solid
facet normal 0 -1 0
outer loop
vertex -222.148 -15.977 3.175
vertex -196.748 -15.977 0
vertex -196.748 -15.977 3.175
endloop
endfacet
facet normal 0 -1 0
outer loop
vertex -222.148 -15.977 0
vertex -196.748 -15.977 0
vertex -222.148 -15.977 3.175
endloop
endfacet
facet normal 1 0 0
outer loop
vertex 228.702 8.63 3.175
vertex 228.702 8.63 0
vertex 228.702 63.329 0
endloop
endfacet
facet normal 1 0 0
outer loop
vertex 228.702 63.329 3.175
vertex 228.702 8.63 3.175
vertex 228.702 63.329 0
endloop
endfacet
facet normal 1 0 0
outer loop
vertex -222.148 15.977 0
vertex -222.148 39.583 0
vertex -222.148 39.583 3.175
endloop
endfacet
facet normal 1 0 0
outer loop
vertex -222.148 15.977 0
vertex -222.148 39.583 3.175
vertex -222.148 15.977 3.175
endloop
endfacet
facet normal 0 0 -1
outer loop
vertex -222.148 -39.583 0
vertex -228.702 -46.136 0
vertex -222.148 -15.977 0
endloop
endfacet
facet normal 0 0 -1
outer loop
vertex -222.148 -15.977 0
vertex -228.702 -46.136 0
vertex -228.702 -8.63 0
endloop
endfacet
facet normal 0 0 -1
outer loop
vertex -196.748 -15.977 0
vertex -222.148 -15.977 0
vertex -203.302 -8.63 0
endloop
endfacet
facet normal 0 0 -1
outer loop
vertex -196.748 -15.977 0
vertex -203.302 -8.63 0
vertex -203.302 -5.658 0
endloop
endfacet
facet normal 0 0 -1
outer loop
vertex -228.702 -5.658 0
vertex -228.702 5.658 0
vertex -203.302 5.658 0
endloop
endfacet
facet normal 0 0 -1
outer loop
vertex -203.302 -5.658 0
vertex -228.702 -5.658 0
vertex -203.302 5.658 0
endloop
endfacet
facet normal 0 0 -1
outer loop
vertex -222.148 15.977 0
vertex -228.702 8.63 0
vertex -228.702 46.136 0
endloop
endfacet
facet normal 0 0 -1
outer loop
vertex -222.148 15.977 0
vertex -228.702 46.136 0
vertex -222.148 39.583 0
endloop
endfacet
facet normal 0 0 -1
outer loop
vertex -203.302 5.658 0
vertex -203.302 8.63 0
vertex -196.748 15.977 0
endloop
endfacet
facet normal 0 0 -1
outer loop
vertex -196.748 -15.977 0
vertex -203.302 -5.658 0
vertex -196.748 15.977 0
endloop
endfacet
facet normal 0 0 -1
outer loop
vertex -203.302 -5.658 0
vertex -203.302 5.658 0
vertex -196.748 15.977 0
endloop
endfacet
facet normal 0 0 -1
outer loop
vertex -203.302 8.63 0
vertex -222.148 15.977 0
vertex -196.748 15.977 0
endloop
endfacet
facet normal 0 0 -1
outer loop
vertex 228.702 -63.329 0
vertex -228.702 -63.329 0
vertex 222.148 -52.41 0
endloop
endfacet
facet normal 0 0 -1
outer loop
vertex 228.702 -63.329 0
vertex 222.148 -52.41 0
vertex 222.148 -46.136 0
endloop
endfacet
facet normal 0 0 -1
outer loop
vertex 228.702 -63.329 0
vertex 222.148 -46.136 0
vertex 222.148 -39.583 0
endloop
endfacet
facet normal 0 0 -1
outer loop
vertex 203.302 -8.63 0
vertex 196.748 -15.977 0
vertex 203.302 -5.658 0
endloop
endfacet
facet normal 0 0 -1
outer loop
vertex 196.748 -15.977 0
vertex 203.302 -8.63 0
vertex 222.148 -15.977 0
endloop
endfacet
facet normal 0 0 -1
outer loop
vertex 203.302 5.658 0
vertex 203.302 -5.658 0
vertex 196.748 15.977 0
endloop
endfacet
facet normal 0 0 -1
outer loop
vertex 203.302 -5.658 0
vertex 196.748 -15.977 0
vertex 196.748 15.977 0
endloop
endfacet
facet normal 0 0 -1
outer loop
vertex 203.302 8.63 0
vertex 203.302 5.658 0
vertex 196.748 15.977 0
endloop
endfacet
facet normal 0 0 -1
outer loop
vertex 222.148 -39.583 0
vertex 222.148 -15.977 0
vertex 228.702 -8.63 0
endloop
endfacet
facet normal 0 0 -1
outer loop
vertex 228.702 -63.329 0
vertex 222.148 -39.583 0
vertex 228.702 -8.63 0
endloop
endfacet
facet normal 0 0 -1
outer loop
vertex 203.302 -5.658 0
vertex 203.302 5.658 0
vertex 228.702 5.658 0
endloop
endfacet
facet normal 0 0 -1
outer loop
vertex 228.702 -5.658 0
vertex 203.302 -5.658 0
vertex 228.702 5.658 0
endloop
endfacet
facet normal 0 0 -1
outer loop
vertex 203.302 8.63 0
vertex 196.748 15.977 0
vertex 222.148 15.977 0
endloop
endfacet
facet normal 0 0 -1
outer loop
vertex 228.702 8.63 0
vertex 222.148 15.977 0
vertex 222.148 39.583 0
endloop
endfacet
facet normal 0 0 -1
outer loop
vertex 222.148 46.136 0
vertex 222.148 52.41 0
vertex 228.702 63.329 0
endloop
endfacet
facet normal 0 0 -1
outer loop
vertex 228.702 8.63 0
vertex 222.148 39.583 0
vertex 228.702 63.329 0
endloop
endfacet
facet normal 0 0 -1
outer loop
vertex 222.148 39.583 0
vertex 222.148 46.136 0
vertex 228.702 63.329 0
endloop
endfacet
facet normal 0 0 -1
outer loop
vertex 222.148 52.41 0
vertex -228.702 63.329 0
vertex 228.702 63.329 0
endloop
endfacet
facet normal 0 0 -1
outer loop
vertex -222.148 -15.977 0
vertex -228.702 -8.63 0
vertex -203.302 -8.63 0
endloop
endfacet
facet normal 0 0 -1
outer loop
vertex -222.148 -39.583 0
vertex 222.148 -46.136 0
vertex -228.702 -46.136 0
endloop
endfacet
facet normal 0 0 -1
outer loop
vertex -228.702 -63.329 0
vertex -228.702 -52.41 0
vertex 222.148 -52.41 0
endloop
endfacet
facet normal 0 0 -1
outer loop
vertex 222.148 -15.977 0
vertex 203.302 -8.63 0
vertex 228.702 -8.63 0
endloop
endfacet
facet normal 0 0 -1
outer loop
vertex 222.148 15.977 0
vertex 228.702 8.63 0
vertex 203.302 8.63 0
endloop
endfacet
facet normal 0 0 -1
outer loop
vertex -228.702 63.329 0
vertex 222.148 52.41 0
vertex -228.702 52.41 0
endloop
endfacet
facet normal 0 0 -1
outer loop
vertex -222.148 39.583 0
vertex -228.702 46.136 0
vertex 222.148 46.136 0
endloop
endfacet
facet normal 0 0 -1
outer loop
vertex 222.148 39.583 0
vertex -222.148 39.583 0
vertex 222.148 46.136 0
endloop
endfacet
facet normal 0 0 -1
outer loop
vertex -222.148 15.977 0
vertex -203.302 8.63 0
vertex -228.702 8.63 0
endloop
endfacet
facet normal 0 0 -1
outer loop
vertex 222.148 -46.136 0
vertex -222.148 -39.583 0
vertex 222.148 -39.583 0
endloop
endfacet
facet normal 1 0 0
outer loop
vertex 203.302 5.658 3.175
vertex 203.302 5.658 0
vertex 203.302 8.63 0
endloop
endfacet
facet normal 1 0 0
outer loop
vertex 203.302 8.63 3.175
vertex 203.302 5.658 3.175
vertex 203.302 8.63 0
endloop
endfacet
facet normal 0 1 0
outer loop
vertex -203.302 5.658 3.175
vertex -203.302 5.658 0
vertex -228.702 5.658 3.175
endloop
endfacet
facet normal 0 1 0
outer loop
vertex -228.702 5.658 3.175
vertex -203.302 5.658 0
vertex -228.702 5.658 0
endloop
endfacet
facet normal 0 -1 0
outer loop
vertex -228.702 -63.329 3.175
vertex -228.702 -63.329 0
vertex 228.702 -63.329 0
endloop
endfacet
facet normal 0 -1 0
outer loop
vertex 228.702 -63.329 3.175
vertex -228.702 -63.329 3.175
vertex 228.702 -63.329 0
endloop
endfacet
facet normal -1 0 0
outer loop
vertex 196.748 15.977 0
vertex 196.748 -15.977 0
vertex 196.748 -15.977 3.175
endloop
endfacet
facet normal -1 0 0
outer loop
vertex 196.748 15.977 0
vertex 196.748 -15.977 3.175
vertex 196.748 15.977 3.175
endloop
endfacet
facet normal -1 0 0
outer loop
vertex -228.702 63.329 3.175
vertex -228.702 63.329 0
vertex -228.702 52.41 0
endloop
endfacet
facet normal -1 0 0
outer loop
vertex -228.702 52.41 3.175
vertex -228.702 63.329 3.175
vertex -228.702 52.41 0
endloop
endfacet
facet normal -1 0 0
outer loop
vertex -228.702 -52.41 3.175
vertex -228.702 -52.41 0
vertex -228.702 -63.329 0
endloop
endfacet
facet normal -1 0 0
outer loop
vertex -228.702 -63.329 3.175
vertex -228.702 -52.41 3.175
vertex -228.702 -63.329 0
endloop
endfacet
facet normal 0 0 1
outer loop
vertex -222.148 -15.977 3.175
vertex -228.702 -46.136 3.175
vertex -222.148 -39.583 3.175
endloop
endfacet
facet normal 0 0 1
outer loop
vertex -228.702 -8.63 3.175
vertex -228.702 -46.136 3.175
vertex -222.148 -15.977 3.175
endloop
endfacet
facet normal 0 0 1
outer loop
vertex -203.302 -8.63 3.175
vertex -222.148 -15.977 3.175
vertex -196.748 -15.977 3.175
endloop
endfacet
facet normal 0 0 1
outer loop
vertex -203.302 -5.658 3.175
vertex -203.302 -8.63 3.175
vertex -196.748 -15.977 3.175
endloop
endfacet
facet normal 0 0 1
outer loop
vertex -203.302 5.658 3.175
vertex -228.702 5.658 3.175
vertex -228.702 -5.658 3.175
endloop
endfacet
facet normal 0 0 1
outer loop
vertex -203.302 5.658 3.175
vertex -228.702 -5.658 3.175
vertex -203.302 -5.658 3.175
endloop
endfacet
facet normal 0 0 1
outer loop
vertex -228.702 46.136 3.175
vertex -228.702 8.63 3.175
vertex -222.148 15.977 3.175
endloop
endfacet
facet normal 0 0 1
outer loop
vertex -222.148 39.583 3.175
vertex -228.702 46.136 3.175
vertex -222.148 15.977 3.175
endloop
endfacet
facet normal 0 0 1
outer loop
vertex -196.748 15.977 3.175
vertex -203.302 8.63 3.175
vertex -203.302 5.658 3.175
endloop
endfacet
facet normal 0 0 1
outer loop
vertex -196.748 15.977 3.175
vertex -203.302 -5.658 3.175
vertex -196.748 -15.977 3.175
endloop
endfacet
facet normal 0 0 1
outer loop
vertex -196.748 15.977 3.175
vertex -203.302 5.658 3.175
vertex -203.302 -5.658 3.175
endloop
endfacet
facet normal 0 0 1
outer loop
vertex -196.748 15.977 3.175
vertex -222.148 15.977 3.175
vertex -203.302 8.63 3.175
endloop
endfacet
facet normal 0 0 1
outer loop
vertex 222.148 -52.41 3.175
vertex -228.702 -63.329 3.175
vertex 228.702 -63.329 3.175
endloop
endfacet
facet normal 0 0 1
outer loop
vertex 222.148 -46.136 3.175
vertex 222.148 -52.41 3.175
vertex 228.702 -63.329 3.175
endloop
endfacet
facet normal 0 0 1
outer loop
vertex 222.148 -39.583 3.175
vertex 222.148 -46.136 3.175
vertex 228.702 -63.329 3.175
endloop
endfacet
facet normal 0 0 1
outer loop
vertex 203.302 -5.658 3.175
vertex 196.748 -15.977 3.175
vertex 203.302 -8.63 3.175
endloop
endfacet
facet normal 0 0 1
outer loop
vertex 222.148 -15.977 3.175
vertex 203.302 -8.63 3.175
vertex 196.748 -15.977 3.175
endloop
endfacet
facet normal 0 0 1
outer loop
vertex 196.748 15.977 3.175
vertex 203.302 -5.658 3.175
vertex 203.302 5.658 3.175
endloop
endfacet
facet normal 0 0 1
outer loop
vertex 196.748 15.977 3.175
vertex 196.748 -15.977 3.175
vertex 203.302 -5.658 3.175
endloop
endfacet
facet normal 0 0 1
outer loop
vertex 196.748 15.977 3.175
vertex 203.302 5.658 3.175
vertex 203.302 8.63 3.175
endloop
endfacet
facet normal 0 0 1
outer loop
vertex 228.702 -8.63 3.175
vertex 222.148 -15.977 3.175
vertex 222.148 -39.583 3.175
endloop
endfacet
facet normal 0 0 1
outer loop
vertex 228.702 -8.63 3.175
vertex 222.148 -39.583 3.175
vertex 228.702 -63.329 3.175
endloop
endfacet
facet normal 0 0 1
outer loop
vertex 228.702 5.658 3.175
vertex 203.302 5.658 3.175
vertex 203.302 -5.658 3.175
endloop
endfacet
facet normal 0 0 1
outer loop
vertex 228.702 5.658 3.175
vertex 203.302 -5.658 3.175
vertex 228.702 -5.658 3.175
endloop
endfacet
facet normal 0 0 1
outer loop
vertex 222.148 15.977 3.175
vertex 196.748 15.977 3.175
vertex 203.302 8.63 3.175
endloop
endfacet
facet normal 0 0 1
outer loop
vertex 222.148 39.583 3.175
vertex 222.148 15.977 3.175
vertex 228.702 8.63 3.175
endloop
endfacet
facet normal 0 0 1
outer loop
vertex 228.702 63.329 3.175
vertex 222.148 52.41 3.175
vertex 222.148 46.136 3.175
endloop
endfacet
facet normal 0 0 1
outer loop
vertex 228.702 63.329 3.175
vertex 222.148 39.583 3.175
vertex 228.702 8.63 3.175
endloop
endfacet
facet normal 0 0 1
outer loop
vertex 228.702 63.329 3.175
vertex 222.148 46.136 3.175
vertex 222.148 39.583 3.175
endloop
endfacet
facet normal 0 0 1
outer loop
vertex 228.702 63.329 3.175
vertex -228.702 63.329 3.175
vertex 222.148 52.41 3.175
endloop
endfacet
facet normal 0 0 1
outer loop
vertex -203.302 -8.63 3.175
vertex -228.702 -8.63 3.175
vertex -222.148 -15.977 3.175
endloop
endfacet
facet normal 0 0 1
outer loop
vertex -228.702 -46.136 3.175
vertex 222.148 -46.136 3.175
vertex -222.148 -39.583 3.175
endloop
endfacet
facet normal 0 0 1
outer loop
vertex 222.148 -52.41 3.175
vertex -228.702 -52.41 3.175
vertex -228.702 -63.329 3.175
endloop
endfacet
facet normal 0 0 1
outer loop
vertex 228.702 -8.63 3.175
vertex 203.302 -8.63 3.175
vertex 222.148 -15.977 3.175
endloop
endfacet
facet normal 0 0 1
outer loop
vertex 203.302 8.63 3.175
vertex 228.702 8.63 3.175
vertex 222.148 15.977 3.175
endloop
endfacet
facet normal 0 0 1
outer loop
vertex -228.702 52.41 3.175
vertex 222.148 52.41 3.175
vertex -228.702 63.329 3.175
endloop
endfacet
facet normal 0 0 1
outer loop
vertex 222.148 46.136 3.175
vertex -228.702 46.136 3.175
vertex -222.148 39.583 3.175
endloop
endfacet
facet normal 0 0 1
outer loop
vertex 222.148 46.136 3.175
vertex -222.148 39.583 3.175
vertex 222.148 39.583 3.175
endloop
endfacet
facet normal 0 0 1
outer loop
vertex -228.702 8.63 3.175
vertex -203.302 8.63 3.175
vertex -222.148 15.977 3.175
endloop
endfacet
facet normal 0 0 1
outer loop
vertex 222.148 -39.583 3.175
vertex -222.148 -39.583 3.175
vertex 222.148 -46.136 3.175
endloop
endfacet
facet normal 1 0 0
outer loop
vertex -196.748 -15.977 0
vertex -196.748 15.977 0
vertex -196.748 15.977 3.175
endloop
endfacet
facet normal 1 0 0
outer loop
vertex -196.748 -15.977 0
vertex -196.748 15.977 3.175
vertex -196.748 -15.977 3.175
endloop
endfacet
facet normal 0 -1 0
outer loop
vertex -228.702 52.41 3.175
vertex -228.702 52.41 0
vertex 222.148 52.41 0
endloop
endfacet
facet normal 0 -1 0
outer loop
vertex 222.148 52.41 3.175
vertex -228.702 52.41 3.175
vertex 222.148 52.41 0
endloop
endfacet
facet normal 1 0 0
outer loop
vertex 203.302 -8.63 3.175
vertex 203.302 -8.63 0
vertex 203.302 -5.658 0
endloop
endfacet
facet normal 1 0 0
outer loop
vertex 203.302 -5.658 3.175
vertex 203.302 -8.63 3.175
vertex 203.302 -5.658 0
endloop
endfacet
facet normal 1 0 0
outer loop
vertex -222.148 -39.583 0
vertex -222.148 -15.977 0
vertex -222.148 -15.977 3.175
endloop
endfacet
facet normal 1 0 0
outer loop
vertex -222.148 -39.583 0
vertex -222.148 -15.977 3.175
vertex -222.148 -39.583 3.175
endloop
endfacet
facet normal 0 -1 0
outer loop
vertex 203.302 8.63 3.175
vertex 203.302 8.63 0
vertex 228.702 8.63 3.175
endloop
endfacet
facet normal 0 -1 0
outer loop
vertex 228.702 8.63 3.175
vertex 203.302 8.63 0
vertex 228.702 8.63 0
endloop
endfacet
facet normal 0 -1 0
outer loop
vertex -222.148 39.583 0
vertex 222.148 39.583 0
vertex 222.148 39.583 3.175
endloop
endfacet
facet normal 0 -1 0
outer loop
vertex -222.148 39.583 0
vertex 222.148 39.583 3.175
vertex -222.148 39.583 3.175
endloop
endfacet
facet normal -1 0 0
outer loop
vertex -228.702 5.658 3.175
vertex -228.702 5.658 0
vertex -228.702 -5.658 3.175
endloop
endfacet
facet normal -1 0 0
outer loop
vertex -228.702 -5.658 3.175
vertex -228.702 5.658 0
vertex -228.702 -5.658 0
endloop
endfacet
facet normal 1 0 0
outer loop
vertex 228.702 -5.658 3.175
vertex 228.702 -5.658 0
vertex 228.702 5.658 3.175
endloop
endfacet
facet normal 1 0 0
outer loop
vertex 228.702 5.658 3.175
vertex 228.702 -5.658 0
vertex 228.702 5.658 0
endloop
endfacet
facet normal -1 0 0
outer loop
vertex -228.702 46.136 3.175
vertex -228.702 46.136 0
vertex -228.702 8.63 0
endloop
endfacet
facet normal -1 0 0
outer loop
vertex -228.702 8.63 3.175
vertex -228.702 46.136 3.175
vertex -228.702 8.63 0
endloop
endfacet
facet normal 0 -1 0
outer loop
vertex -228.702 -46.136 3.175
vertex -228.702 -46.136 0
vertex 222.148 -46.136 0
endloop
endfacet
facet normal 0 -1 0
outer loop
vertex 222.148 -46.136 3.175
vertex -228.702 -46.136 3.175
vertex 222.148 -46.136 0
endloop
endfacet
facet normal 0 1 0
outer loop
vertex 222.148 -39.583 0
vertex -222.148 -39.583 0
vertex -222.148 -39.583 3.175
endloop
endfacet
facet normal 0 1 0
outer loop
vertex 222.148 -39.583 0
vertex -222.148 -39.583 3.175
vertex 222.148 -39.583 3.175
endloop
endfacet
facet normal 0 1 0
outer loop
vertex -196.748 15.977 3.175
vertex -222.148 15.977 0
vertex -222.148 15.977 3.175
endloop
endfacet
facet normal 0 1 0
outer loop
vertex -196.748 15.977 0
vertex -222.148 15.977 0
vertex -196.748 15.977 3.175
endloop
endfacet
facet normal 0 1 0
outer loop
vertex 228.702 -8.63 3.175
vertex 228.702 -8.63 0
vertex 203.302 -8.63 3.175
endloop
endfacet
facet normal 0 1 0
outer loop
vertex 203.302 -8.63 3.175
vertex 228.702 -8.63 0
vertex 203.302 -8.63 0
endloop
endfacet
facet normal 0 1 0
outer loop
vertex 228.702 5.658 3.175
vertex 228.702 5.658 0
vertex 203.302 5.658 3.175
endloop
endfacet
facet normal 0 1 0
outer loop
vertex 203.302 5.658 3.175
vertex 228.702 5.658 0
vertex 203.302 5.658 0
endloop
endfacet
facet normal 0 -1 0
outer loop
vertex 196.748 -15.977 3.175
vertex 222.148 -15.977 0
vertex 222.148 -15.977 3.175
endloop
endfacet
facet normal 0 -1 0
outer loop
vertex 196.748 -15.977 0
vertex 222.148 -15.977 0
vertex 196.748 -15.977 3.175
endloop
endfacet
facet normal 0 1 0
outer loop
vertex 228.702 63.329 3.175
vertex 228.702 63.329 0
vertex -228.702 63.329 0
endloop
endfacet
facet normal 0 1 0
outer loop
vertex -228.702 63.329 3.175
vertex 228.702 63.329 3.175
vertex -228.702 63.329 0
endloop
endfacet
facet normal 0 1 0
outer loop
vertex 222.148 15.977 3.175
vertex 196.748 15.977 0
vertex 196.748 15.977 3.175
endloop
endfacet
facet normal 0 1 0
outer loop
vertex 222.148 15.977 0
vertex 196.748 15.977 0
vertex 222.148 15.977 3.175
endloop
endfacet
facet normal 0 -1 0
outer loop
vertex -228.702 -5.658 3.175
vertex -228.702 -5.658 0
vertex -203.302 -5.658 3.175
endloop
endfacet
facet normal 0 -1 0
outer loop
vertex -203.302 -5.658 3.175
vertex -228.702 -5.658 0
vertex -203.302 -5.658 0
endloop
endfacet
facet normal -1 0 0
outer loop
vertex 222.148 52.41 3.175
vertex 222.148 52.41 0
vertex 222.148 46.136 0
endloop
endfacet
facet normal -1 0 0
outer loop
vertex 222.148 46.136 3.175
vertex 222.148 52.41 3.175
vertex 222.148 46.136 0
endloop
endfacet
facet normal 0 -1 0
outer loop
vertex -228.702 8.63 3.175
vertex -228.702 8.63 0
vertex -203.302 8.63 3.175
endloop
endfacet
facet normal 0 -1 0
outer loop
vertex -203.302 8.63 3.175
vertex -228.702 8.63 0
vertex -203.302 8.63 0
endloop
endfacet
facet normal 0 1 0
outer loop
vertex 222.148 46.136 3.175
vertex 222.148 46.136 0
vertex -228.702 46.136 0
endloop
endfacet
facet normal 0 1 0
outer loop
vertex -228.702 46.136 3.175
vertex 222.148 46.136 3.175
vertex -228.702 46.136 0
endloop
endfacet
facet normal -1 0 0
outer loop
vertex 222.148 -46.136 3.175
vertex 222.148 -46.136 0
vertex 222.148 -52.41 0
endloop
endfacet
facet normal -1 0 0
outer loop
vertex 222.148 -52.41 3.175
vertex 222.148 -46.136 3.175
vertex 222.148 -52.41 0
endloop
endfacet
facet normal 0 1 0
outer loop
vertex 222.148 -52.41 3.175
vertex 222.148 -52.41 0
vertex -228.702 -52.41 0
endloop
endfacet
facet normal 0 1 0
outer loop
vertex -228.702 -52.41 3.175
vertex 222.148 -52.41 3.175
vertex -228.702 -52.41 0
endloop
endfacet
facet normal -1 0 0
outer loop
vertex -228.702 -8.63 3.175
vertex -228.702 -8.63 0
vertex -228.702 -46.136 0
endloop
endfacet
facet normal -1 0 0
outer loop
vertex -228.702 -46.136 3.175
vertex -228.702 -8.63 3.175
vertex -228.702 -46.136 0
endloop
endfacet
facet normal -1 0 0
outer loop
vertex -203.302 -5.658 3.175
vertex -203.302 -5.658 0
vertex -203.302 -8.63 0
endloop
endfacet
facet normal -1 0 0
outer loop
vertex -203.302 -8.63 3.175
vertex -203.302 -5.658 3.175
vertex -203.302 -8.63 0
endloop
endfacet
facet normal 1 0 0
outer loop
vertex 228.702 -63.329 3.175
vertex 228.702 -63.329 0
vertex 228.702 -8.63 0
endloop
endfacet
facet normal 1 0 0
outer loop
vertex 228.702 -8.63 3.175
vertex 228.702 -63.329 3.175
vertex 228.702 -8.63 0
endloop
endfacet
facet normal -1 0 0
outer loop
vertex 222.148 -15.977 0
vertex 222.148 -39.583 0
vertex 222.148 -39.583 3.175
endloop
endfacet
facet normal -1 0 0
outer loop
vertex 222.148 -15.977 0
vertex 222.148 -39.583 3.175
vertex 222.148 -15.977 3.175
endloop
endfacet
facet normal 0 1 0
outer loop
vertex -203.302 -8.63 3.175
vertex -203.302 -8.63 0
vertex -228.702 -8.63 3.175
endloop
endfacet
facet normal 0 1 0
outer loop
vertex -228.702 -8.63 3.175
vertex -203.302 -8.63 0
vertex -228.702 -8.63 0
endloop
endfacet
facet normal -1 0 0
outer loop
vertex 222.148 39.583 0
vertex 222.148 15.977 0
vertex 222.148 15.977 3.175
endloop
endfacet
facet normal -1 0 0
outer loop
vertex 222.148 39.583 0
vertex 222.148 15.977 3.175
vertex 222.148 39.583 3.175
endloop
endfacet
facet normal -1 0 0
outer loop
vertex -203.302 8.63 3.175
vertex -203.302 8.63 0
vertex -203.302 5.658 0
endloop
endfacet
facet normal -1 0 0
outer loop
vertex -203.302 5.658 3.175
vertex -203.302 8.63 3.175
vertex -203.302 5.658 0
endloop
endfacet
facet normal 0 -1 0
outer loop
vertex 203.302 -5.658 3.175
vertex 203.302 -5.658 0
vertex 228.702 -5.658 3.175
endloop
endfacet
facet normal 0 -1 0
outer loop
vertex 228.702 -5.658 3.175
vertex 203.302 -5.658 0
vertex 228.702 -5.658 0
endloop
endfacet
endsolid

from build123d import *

# Parameters (mm, degrees)
BOSS_EXTRUDE1_DEPTH = 3.175


with BuildPart() as part:
    # Sketch1 → Boss-Extrude1 (new body)
    with BuildSketch(Plane.XY):
        Polygon((-203.3016, -8.62965), (-228.7016, -8.62965), (-228.7016, -46.135925), (222.1484, -46.135925), (222.1484, -52.409725), (-228.7016, -52.409725), (-228.7016, -63.32855), (228.7016, -63.32855), (228.7016, -8.62965), (203.3016, -8.62965), (203.3016, -5.65785), (228.7016, -5.65785), (228.7016, 5.65785), (203.3016, 5.65785), (203.3016, 8.62965), (228.7016, 8.62965), (228.7016, 63.32855), (-228.7016, 63.32855), (-228.7016, 52.409725), (222.1484, 52.409725), (222.1484, 46.135925), (-228.7016, 46.135925), (-228.7016, 8.62965), (-203.3016, 8.62965), (-203.3016, 5.65785), (-228.7016, 5.65785), (-228.7016, -5.65785), (-203.3016, -5.65785), align=None)
        Polygon((222.1484, -39.582725), (222.1484, -15.9766), (196.7484, -15.9766), (196.7484, 15.9766), (222.1484, 15.9766), (222.1484, 39.582725), (-222.1484, 39.582725), (-222.1484, 15.9766), (-196.7484, 15.9766), (-196.7484, -15.9766), (-222.1484, -15.9766), (-222.1484, -39.582725), align=None, mode=Mode.SUBTRACT)
    extrude(amount=BOSS_EXTRUDE1_DEPTH)


solid = part.part
